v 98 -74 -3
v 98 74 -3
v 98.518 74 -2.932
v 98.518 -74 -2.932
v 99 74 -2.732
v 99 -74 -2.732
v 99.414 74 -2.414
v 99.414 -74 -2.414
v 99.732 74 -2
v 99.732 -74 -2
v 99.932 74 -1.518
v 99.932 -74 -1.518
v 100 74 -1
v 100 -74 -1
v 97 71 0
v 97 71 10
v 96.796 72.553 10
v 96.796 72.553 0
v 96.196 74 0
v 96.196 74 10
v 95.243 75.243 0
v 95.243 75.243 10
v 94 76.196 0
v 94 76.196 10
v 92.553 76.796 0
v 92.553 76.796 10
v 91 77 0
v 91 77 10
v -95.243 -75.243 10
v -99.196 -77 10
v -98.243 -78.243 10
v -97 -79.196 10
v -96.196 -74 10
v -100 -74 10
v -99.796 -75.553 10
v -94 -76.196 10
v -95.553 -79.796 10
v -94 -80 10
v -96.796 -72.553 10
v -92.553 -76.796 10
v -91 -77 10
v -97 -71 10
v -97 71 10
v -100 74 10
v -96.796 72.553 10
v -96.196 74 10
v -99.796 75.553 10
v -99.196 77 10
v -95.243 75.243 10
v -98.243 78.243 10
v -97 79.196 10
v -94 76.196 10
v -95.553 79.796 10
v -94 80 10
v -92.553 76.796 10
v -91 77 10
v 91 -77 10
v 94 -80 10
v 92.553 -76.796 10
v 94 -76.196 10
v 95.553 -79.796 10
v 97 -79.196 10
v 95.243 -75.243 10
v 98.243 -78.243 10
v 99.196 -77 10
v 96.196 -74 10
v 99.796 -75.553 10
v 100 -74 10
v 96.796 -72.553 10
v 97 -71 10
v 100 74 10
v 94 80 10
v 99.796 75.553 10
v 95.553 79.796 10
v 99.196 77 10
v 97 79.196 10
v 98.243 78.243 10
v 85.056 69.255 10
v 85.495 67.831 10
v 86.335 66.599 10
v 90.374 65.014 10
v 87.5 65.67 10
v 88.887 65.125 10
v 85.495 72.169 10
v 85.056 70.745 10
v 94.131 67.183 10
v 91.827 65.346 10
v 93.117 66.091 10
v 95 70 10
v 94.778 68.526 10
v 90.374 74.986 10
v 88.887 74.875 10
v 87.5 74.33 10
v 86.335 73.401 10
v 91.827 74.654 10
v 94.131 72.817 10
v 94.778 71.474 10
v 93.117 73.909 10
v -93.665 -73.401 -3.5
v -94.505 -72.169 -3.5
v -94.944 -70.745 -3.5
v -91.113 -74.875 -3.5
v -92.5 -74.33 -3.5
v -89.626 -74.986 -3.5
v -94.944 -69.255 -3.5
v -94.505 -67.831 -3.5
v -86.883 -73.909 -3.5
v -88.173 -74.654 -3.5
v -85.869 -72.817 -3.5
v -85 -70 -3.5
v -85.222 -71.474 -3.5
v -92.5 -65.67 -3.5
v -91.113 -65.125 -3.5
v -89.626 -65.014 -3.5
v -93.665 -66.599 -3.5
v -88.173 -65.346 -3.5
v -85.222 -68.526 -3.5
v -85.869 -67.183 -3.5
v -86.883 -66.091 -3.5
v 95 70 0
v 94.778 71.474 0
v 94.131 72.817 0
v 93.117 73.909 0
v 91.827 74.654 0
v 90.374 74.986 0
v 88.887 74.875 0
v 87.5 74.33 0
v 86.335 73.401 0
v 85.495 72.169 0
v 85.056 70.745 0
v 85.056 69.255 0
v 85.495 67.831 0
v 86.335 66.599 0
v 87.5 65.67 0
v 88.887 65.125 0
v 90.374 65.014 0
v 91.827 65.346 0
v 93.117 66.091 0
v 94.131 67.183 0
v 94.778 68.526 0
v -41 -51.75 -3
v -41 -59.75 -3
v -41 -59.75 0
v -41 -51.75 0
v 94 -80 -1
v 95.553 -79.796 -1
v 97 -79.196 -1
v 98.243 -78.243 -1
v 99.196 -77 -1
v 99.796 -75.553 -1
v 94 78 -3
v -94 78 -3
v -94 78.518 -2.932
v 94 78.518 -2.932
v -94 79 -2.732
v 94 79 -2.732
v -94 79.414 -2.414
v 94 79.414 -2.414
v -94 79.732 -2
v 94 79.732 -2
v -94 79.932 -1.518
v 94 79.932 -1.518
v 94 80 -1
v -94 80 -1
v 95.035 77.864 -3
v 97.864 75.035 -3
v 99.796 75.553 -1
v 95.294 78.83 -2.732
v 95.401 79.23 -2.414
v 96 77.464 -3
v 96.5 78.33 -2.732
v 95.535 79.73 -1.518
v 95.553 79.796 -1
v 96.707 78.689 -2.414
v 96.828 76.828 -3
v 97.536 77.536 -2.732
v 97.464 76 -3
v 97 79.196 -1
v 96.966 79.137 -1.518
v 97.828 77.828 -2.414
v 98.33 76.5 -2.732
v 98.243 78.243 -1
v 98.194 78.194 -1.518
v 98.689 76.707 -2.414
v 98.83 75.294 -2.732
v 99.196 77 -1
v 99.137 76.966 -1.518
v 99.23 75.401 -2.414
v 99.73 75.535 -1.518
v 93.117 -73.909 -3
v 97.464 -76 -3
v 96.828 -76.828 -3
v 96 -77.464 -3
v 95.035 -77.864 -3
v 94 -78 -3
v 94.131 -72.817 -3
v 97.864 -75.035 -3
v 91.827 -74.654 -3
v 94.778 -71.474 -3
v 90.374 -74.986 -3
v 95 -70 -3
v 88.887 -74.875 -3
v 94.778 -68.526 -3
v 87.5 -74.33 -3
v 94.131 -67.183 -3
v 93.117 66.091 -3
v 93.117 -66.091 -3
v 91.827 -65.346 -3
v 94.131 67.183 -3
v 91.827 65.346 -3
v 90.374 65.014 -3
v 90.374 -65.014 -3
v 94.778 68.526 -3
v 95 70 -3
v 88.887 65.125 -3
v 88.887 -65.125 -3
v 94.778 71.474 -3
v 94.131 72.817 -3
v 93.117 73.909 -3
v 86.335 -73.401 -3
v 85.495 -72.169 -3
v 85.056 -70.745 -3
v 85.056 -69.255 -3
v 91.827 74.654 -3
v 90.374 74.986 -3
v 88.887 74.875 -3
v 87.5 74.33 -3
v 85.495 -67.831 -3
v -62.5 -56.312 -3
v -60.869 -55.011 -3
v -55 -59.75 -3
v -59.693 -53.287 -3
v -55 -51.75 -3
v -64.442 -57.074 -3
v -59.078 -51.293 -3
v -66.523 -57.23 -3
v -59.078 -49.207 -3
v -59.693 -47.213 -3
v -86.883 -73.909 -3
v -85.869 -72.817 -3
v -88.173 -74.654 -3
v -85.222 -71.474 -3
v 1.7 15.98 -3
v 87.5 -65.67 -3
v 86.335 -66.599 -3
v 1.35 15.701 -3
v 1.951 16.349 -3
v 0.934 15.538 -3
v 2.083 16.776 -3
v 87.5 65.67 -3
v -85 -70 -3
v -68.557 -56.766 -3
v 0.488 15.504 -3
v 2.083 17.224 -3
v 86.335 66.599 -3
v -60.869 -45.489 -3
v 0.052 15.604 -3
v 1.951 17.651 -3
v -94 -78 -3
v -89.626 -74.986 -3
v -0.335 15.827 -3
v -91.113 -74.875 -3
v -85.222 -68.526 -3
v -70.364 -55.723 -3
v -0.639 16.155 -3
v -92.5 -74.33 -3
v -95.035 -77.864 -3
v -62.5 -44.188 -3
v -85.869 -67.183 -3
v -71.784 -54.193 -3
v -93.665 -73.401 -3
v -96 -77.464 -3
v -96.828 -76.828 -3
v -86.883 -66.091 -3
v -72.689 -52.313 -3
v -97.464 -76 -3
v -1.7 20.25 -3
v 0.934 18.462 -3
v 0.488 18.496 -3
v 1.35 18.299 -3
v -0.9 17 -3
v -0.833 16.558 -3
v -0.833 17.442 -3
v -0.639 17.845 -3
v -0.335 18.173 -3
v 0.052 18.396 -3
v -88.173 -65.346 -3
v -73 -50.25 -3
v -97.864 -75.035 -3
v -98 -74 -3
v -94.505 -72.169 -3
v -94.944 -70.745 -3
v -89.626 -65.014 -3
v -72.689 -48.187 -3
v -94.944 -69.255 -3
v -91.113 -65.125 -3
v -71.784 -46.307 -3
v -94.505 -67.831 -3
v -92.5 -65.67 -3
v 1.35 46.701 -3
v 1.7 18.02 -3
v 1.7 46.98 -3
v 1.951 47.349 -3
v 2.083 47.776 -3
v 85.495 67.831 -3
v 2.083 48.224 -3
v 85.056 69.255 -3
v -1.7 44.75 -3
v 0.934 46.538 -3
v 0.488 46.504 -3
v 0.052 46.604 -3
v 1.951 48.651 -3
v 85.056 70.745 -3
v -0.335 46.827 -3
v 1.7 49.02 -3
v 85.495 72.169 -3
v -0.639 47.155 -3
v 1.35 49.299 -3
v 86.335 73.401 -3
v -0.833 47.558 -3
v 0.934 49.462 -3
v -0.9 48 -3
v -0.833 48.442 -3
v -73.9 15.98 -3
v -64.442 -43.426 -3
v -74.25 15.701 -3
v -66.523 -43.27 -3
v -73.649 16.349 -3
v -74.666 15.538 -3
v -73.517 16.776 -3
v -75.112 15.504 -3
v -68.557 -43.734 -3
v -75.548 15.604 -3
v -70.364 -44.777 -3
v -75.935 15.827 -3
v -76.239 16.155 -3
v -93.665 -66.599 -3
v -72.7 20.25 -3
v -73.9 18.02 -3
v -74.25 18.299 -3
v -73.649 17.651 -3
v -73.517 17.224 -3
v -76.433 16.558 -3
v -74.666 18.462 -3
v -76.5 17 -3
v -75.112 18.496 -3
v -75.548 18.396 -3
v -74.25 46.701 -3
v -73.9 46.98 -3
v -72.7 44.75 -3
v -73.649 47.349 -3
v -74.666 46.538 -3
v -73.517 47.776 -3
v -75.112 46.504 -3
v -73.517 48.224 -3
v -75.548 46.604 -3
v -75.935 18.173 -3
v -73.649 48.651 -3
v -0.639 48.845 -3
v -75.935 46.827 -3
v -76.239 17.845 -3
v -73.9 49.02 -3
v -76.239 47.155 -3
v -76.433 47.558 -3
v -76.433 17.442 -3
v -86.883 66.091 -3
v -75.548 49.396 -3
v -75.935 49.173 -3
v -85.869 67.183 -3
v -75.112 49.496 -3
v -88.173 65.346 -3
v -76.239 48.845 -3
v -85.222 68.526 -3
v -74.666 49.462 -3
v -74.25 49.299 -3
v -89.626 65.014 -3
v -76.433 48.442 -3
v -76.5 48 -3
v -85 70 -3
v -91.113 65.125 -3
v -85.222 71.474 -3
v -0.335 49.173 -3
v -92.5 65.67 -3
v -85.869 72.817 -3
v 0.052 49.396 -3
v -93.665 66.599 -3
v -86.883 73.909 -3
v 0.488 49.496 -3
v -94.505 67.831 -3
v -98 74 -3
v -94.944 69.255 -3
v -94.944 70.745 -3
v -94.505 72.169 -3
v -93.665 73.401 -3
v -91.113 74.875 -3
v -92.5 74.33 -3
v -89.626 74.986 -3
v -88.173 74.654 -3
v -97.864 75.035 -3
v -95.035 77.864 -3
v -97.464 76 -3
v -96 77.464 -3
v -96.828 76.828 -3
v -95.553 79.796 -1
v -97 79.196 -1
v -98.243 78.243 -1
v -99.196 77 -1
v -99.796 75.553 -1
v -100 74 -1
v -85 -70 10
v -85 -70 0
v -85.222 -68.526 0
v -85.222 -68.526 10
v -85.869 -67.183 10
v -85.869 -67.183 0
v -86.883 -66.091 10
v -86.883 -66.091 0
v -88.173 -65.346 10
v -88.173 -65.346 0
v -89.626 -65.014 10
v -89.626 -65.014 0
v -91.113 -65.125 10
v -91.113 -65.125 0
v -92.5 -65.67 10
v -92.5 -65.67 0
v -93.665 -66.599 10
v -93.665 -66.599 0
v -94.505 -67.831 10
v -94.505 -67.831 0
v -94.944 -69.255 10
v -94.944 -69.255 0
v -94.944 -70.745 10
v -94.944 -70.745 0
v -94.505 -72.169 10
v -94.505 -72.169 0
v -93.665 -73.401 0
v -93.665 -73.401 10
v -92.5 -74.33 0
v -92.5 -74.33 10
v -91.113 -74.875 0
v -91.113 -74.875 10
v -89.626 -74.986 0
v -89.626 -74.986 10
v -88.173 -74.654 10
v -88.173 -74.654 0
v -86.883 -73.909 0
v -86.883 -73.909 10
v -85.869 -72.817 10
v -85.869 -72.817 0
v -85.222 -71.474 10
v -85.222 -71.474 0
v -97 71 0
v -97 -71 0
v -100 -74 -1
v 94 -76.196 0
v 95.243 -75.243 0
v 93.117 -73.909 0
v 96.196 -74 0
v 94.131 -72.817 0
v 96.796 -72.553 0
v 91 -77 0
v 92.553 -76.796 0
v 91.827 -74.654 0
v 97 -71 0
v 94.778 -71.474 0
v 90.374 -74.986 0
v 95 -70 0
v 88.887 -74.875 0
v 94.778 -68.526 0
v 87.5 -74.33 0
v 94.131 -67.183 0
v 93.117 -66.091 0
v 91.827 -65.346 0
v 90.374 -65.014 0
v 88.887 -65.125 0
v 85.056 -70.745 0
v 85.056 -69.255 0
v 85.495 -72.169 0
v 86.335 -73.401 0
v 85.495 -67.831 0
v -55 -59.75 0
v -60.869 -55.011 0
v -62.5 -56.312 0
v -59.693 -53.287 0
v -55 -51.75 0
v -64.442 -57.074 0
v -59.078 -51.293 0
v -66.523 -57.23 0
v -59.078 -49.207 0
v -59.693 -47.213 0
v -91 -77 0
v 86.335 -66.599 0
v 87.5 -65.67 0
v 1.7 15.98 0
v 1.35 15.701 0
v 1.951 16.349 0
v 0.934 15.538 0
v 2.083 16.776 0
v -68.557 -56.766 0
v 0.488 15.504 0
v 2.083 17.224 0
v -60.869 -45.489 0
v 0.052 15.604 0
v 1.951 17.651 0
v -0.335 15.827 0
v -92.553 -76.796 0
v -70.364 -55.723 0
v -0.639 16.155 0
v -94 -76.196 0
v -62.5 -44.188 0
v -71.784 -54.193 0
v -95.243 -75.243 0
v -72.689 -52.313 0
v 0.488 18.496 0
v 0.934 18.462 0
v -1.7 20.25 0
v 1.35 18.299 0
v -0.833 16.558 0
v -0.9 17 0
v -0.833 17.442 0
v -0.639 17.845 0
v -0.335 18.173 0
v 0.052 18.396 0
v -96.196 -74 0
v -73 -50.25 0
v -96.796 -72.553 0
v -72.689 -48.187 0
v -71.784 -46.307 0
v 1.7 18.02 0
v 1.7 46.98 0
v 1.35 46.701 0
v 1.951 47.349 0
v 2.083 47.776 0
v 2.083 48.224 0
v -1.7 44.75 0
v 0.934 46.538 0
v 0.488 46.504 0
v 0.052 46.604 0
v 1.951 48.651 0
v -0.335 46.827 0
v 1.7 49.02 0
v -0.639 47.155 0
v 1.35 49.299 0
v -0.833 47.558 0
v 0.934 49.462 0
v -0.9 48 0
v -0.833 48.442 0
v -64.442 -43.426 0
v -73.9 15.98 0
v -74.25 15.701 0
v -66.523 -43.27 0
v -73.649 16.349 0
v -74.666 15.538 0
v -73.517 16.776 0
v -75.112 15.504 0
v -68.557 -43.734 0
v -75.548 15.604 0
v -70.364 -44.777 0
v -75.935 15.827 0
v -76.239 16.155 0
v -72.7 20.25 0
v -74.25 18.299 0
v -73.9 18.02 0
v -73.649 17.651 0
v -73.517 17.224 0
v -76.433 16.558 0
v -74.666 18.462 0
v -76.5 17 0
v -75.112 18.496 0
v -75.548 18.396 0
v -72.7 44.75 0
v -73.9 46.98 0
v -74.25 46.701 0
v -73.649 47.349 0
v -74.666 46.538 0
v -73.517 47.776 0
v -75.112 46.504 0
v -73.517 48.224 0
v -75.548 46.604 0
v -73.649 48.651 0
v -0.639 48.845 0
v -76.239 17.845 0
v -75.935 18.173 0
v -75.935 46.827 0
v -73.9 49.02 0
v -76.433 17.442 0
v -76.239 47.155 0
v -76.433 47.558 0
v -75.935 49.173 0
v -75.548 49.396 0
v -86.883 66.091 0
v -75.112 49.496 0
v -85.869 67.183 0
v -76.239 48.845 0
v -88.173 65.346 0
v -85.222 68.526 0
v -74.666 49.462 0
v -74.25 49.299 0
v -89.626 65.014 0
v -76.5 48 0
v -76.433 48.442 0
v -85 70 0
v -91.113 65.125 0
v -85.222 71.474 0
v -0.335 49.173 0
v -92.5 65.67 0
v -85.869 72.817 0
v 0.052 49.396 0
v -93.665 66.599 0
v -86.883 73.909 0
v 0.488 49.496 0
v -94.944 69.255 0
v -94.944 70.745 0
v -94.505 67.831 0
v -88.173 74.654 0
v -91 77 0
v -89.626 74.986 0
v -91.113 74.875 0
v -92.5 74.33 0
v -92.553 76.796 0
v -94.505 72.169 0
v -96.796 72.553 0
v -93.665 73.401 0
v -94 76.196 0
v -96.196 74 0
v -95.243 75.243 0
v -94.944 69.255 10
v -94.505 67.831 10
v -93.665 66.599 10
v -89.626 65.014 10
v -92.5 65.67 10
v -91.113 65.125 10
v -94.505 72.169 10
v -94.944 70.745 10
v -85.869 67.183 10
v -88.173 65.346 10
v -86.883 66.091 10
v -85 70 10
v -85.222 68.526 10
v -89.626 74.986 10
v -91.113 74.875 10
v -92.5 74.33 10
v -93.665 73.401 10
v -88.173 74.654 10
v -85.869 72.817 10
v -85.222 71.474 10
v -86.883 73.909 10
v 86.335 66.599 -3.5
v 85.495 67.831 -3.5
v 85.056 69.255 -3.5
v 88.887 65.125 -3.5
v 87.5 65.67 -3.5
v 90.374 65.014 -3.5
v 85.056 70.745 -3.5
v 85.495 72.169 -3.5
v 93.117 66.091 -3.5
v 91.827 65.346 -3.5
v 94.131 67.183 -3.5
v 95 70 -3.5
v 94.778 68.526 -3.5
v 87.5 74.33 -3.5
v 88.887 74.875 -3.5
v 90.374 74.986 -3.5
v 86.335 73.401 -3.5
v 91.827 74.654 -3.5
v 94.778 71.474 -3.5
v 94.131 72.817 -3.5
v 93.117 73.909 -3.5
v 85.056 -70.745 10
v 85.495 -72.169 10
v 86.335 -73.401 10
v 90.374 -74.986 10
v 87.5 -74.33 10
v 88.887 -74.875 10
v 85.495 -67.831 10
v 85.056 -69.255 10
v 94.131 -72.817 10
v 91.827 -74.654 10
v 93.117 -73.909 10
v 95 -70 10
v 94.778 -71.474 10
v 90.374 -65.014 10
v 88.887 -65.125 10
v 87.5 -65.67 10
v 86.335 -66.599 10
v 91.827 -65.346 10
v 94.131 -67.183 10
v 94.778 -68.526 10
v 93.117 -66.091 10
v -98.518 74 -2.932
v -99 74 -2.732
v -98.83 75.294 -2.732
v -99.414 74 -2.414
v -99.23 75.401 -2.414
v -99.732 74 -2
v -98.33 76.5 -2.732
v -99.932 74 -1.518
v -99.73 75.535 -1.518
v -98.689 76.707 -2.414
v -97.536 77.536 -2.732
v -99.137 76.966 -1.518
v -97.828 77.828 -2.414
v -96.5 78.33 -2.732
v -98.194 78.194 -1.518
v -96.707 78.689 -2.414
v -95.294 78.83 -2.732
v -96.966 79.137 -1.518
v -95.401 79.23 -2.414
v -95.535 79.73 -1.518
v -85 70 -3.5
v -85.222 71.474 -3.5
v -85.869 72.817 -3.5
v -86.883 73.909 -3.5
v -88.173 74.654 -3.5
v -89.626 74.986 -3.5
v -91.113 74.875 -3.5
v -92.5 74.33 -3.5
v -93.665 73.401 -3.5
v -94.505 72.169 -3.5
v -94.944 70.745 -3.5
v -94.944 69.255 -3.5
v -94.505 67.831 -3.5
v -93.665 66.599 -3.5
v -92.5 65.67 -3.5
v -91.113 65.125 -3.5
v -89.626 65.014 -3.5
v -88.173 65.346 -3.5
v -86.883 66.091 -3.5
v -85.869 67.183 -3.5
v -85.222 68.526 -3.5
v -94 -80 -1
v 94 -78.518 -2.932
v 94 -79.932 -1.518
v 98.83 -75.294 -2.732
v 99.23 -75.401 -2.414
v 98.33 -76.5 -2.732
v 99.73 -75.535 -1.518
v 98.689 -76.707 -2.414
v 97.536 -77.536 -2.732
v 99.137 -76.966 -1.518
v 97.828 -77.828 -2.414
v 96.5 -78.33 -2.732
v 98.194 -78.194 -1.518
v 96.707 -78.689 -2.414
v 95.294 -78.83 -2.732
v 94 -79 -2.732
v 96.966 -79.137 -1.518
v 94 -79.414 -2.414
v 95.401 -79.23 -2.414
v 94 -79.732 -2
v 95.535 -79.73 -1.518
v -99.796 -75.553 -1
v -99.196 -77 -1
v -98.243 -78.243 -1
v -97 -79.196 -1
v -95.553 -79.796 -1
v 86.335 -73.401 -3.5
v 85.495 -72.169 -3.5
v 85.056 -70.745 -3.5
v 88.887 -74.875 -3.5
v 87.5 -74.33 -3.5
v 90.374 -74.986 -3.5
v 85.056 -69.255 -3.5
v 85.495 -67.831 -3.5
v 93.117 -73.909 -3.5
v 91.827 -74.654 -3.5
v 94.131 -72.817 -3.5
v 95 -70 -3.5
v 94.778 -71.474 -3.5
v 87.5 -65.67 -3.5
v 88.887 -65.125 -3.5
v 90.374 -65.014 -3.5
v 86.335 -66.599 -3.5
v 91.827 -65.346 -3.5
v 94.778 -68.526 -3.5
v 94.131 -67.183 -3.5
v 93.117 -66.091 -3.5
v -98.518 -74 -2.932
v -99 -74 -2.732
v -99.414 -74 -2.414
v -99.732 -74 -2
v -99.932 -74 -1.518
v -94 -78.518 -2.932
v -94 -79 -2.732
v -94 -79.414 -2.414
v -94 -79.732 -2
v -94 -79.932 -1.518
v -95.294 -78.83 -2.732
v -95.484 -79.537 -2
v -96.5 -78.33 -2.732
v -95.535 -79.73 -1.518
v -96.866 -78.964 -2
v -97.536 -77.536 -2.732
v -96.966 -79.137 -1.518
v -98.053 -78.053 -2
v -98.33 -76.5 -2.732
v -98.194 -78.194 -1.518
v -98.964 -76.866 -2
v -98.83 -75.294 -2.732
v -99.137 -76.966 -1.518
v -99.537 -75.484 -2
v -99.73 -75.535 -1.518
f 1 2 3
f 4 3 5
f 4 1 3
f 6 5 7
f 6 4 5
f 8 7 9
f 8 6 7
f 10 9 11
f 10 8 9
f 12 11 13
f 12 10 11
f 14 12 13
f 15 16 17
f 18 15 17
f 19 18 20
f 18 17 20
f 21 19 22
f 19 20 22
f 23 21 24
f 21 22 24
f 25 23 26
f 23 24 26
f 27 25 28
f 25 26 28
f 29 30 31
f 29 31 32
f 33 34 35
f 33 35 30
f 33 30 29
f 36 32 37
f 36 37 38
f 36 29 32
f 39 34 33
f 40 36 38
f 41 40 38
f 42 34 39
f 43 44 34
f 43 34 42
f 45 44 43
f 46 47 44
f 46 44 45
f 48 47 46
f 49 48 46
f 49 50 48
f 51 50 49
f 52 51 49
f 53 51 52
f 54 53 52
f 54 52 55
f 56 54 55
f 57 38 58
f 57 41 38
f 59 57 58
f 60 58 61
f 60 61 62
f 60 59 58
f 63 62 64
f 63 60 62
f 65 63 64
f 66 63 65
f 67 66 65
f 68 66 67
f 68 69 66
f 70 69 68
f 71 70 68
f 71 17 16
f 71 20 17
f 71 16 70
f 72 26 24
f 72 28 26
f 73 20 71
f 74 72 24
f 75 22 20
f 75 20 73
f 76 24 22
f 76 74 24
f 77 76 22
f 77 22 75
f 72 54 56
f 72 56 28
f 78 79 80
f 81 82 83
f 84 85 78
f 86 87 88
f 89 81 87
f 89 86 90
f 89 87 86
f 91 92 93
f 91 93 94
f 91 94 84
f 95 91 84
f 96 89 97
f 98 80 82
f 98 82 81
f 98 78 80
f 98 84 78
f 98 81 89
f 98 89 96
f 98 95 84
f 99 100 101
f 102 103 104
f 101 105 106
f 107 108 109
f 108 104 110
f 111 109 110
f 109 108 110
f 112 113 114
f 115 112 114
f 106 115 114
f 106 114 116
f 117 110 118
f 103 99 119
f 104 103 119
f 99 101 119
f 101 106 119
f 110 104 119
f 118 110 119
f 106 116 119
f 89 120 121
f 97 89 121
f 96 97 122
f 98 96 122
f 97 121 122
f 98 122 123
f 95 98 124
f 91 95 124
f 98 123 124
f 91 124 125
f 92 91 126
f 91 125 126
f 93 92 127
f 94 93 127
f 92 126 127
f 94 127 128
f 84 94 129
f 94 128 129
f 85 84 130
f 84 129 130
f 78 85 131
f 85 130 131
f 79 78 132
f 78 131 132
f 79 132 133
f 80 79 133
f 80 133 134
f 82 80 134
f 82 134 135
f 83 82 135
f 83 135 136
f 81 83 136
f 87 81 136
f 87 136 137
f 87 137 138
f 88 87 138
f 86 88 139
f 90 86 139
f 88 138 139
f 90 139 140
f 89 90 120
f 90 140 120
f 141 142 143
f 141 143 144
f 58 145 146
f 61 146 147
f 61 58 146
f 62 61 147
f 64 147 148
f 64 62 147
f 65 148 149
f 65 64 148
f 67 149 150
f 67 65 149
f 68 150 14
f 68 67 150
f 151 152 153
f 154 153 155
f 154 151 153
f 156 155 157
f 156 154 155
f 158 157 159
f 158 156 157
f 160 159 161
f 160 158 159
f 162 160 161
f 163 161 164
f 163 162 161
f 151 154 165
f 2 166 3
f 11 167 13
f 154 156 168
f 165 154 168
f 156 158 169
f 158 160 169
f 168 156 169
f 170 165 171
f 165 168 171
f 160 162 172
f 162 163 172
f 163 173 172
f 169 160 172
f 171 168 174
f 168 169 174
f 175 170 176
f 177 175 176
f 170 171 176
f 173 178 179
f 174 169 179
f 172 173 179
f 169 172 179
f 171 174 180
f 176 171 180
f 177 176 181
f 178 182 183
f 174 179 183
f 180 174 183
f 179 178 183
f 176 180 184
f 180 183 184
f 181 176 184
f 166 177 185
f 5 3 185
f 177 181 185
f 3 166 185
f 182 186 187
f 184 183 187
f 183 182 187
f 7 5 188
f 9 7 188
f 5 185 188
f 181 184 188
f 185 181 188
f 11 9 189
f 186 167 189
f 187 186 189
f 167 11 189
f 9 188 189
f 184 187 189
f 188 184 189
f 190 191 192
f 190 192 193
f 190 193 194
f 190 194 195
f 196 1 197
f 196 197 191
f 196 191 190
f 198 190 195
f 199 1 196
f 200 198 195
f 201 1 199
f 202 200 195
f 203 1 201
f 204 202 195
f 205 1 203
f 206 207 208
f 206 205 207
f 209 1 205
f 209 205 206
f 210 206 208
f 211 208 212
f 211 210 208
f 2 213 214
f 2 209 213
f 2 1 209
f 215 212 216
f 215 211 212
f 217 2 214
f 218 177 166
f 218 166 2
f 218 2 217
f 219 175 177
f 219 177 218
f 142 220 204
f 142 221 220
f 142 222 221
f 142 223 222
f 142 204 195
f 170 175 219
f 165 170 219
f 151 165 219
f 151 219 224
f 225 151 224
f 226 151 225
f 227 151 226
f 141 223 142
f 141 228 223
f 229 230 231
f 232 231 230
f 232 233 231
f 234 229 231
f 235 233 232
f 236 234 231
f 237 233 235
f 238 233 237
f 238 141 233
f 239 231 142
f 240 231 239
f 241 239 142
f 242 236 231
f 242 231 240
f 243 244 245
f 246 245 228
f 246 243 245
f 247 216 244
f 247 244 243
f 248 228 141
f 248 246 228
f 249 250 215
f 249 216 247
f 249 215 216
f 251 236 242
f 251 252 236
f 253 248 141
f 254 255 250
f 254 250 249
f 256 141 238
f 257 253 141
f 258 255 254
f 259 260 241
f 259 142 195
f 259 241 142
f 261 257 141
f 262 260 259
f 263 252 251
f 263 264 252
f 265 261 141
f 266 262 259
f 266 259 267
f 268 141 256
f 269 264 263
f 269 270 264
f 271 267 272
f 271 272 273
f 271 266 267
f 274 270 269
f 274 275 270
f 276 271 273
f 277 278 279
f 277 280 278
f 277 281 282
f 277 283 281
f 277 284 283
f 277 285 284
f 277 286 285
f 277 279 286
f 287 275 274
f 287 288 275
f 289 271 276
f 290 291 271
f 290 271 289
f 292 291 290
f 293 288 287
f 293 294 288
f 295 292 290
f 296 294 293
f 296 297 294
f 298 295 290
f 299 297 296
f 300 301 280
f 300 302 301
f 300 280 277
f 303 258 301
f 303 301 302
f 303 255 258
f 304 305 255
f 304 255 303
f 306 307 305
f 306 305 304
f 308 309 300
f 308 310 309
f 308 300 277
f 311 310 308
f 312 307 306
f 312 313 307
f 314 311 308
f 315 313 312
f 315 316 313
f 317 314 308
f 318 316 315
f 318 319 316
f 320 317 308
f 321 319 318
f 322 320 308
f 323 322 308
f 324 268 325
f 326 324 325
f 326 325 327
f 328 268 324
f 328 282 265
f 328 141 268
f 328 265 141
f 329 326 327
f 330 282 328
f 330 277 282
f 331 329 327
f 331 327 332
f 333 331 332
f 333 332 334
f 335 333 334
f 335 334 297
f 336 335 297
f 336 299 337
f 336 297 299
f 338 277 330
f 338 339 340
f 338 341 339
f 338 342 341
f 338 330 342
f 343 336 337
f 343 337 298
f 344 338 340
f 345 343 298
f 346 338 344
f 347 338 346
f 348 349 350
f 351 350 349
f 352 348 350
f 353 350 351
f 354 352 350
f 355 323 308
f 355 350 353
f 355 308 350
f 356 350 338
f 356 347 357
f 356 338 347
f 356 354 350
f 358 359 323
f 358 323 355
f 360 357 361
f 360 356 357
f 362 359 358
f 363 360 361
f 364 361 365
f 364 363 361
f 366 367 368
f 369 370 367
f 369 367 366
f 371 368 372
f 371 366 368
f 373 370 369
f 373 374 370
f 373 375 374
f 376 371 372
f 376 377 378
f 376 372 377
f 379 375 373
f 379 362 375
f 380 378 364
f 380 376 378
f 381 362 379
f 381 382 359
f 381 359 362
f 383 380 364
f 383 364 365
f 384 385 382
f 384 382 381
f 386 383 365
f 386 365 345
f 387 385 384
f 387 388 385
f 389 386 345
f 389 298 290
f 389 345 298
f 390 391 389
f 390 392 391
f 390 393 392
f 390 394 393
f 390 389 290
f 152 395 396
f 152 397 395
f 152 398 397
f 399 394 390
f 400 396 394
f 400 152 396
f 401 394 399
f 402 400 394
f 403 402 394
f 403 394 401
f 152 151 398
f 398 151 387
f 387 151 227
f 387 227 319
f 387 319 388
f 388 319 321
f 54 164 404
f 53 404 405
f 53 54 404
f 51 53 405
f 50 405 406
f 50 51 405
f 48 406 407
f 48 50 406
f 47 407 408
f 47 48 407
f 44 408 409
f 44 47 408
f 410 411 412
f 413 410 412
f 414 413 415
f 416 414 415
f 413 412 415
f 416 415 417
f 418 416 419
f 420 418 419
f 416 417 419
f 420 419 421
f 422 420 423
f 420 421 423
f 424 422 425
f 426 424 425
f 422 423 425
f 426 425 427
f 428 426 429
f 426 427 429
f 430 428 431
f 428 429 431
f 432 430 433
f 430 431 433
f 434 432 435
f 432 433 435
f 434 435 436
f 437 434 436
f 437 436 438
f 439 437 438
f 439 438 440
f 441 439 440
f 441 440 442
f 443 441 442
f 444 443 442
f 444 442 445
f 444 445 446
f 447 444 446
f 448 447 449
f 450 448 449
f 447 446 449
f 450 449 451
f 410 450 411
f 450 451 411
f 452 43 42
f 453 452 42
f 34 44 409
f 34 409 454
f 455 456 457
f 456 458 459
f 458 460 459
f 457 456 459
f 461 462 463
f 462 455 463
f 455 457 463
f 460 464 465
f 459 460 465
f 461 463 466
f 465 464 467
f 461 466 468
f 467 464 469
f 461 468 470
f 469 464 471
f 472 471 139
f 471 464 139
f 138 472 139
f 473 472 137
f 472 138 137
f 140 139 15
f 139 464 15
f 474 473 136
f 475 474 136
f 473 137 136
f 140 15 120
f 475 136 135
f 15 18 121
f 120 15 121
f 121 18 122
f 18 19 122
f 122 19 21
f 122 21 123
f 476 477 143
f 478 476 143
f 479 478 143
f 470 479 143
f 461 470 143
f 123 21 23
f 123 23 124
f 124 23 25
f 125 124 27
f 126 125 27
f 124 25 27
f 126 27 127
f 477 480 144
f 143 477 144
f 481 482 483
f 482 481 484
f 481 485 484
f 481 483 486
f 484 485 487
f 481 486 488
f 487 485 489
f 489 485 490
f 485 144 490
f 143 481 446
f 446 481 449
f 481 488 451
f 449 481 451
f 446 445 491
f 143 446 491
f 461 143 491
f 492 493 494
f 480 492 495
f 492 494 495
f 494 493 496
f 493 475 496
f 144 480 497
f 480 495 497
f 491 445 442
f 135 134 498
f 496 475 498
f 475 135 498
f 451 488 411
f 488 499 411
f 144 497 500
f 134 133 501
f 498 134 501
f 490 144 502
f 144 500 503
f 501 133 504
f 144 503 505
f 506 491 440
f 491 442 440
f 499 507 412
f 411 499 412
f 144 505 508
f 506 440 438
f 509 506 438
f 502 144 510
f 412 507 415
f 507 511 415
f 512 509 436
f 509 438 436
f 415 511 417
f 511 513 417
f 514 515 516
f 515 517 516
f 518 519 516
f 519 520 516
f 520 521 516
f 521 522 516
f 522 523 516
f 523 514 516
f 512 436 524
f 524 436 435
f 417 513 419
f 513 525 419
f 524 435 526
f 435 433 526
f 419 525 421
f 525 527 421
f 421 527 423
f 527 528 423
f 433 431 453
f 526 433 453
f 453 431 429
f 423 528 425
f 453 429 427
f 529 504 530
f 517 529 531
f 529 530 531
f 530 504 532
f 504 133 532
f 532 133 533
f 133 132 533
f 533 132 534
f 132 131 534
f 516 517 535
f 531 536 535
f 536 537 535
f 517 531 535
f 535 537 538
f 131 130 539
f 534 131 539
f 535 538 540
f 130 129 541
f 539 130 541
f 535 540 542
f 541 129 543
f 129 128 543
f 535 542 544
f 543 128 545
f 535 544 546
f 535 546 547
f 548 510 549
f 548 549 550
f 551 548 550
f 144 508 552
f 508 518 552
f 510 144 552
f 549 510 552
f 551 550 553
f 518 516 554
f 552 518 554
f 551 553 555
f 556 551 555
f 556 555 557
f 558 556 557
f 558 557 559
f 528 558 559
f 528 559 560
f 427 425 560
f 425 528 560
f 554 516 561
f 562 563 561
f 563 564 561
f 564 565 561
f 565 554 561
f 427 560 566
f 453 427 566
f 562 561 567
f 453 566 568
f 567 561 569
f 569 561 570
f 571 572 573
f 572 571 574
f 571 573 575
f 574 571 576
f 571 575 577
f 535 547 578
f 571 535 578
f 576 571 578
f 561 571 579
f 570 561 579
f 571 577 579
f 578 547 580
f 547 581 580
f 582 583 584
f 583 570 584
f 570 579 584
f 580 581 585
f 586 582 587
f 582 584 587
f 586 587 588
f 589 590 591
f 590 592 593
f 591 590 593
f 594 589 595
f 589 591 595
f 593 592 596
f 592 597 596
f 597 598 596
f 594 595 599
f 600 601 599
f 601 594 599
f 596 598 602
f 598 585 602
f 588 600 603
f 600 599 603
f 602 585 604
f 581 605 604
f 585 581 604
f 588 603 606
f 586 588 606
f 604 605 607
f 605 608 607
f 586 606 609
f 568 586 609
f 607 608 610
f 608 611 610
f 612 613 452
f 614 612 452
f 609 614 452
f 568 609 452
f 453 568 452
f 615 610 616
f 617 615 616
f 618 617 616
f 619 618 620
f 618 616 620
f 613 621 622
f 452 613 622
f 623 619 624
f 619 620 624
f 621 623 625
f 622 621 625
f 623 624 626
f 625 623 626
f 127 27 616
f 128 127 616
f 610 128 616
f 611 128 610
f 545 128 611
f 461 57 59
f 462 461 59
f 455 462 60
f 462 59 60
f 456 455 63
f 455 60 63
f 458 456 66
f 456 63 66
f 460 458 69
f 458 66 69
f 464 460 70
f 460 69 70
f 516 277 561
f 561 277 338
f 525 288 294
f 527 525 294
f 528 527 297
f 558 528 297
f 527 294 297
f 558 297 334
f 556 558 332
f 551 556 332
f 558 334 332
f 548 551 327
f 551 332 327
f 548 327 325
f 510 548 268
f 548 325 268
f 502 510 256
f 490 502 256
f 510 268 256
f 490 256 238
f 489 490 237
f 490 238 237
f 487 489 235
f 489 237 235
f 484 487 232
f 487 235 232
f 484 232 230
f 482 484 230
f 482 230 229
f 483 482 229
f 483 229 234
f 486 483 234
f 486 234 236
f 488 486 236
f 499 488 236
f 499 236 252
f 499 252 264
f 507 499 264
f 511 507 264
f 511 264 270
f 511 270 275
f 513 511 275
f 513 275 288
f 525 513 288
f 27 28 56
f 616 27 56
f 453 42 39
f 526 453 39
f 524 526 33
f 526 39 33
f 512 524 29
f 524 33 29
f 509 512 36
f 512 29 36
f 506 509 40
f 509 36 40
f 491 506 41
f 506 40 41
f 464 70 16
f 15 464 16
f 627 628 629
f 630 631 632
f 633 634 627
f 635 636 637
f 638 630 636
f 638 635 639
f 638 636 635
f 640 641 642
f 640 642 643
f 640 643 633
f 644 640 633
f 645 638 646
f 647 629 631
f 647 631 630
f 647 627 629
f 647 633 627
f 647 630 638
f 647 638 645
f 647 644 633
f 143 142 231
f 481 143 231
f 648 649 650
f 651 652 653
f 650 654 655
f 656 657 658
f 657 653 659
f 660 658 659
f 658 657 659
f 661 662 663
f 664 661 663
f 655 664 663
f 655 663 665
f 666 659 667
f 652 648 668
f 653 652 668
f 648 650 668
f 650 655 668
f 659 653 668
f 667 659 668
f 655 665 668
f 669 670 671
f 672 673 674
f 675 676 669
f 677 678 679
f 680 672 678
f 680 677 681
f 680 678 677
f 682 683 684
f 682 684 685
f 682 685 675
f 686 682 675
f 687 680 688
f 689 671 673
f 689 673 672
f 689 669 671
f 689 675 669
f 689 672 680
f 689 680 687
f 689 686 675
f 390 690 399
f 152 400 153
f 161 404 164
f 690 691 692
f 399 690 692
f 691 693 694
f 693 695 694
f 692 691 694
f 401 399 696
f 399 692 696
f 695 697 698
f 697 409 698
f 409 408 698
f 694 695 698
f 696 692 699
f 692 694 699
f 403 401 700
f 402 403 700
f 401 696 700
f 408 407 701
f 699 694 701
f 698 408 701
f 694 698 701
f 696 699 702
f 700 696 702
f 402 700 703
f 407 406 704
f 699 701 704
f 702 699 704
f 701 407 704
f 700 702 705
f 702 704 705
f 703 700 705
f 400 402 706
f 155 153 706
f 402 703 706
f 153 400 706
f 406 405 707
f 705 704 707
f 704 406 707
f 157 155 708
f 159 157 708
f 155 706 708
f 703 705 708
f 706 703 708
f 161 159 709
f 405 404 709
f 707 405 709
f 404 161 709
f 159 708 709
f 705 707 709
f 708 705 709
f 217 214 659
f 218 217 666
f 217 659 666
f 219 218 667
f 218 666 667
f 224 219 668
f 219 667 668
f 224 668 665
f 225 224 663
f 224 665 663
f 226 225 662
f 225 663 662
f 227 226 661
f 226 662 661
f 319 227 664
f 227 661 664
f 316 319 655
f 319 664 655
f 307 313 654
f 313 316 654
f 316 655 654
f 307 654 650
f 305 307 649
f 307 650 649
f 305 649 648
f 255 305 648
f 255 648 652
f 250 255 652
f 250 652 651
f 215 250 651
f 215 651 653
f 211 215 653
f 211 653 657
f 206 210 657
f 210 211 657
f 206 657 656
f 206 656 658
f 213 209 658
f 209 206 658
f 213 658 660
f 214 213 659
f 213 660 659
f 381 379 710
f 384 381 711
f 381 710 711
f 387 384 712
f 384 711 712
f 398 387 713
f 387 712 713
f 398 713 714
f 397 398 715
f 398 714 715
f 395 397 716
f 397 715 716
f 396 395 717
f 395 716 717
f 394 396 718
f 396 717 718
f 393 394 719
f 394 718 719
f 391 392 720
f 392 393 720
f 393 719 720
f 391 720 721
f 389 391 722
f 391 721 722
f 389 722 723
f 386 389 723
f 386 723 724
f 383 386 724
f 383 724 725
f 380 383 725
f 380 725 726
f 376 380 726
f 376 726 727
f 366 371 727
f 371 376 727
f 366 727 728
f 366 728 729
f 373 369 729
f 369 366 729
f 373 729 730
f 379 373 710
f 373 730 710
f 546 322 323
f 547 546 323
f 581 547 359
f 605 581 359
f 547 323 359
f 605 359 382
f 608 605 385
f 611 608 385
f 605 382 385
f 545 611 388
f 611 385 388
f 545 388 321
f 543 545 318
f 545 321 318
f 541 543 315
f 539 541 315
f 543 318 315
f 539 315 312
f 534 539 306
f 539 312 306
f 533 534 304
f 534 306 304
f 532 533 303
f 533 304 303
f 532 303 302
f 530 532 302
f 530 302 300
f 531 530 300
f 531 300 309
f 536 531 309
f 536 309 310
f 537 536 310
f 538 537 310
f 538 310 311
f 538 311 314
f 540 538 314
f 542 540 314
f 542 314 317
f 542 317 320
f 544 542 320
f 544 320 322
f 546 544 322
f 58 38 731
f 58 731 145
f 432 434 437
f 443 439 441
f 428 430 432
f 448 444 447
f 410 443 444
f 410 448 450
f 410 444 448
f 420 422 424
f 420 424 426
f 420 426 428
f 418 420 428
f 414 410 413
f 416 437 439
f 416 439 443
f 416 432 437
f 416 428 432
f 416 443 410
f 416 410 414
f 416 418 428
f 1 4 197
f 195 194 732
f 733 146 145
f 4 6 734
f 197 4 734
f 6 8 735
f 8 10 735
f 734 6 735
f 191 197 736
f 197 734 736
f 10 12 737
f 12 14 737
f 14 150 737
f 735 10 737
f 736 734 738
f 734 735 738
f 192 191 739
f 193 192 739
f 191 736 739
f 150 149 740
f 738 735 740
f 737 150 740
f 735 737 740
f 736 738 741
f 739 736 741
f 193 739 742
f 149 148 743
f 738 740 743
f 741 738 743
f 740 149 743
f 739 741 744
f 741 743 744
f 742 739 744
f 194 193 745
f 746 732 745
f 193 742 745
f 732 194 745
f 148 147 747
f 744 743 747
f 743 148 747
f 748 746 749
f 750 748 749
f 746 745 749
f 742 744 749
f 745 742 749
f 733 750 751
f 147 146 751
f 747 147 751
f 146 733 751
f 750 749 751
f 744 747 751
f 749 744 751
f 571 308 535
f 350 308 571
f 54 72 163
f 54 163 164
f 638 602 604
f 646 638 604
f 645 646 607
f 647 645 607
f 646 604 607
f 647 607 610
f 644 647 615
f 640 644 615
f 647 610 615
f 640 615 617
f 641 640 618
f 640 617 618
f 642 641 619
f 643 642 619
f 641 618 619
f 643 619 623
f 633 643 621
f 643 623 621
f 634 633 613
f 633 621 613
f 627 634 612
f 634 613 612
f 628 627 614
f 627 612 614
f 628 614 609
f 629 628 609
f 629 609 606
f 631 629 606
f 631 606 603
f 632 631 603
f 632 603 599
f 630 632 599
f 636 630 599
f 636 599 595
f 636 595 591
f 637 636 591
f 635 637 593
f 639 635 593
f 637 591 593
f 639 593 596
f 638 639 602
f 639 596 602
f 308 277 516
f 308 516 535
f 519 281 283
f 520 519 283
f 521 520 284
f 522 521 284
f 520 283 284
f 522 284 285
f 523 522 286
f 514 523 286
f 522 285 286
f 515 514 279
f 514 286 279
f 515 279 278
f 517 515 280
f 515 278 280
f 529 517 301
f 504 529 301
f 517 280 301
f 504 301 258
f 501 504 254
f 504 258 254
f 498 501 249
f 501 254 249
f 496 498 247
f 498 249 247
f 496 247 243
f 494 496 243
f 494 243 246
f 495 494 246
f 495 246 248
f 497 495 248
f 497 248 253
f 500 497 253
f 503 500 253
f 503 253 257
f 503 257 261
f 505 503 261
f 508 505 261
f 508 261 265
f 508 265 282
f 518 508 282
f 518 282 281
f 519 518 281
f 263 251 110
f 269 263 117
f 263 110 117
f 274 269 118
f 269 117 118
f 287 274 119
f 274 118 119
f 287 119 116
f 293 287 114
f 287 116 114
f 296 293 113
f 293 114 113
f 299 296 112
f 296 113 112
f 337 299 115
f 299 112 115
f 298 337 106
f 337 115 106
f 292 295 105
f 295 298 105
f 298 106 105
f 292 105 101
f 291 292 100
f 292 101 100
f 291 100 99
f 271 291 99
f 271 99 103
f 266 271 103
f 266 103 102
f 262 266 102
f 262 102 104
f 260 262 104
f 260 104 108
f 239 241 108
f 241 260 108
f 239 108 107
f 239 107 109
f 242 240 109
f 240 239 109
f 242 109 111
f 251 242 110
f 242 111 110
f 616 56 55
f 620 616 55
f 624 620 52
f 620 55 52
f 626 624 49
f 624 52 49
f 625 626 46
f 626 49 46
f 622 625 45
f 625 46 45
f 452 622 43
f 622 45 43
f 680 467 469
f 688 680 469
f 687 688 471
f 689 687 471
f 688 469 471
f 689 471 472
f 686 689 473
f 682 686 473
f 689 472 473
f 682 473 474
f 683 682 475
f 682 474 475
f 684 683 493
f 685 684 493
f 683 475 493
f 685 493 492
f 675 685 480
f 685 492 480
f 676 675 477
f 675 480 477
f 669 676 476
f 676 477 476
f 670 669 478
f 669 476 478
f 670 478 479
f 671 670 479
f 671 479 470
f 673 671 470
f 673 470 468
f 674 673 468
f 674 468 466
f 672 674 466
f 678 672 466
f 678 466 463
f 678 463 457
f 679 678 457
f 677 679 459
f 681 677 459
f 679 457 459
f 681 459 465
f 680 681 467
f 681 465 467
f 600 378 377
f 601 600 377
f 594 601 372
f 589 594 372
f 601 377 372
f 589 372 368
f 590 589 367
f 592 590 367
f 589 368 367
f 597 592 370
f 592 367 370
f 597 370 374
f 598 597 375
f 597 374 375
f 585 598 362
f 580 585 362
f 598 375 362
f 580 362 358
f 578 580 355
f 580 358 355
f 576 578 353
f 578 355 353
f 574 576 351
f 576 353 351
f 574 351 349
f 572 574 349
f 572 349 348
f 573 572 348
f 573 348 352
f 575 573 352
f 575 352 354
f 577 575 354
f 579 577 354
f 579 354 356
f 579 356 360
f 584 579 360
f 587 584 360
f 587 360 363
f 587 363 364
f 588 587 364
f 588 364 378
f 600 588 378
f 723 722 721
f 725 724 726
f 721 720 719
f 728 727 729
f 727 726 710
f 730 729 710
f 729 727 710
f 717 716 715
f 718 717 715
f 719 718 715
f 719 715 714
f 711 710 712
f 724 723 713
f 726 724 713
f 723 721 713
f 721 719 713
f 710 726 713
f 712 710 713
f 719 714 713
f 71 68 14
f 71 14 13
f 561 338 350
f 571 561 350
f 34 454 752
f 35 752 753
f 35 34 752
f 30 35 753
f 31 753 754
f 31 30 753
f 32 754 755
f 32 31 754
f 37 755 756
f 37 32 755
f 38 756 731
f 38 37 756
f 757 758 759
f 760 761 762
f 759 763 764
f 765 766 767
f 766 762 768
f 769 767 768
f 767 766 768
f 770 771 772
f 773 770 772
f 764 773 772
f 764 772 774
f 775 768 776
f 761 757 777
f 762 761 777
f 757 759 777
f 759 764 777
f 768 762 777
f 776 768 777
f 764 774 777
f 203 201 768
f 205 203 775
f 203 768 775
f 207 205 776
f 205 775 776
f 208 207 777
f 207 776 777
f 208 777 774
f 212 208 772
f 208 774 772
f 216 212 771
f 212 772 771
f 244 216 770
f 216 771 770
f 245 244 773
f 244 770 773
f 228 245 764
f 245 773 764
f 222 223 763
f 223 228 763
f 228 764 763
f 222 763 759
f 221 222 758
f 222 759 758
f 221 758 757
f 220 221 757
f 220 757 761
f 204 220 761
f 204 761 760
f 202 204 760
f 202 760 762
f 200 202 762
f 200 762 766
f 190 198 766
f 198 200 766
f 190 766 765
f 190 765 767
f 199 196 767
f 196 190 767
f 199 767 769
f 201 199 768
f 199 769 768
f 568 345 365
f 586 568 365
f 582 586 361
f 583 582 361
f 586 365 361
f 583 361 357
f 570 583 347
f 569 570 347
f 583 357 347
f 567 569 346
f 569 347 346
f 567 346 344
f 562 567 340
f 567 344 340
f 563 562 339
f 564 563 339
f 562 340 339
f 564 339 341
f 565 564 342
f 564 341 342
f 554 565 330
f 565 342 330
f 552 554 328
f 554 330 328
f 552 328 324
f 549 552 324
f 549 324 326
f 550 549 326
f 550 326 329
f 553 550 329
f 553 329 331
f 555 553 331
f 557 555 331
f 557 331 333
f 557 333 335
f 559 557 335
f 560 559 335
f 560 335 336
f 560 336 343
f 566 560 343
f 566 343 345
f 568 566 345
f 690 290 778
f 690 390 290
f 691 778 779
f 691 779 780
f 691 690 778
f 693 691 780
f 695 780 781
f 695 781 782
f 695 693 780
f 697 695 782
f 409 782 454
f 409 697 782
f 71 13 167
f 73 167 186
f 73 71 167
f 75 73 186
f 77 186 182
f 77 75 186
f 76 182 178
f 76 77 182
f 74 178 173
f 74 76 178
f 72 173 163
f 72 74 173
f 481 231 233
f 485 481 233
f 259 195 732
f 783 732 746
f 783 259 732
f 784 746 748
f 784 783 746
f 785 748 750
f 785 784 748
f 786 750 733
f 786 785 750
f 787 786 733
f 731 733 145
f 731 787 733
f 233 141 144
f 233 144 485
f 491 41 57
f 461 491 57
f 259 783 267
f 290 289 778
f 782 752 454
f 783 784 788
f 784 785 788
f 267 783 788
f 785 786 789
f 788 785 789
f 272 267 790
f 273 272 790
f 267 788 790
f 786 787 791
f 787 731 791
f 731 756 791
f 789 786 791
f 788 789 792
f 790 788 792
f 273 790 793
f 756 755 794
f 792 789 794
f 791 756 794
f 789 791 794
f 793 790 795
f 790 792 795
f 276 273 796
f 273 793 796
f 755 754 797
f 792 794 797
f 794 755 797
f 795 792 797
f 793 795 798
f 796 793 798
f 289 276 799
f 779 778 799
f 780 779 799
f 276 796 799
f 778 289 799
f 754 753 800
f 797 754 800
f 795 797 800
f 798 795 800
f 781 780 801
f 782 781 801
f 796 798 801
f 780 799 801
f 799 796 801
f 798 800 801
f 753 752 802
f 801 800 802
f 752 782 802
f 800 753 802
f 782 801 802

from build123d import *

# Parameters (mm, degrees)
BOSS_EXTRU_1_DEPTH      = 3
BOSS_EXTRU_2_START      = 10
BOSS_EXTRU_2_DEPTH      = 10
ESQUISSE2_R             = 5
BOSS_EXTRU_3_DEPTH      = 10
CONG_1_R                = 2
BOSS_EXTRU_4_START      = -3.5
ESQUISSE2_2_R           = 5
BOSS_EXTRU_4_DEPTH      = 3.5
ESQUISSE3_R             = 1.5
ESQUISSE3_W             = 71
ESQUISSE3_H             = 24.5
ENL_V_MAT_EXTRU_1_DEPTH = 3.5
ESQUISSE4_R             = 7
ESQUISSE4_W             = 14
ESQUISSE4_H             = 8
ENL_V_MAT_EXTRU_2_DEPTH = 10


with BuildPart() as part:
    # Esquisse1 → Boss.-Extru.1 (new body)
    with BuildSketch(Plane.XY):
        with BuildLine():
            ThreePointArc((-100, -74), (-98.242640687, -78.242640687), (-94, -80))
            Line((-94, -80), (94, -80))
            ThreePointArc((94, -80), (98.242640687, -78.242640687), (100, -74))
            Line((100, -74), (100, 74))
            ThreePointArc((100, 74), (98.242640687, 78.242640687), (94, 80))
            Line((94, 80), (-94, 80))
            ThreePointArc((-94, 80), (-98.242640687, 78.242640687), (-100, 74))
            Line((-100, 74), (-100, -74))
        make_face()
    extrude(amount=-BOSS_EXTRU_1_DEPTH)

    # Esquisse1<3> → Boss.-Extru.2 (add)
    with BuildSketch(Plane.XY.offset(BOSS_EXTRU_2_START)):
        with BuildLine():
            Line((-94, -80), (94, -80))
            ThreePointArc((94, -80), (98.242640687, -78.242640687), (100, -74))
            Line((100, -74), (100, 74))
            ThreePointArc((100, 74), (98.242640687, 78.242640687), (94, 80))
            Line((94, 80), (-94, 80))
            ThreePointArc((-94, 80), (-98.242640687, 78.242640687), (-100, 74))
            Line((-100, 74), (-100, -74))
            ThreePointArc((-100, -74), (-98.242640687, -78.242640687), (-94, -80))
        make_face()
        with BuildLine():
            Line((-91, -77), (91, -77))
            ThreePointArc((91, -77), (95.242640687, -75.242640687), (97, -71))
            Line((97, -71), (97, 71))
            ThreePointArc((97, 71), (95.242640687, 75.242640687), (91, 77))
            Line((91, 77), (-91, 77))
            ThreePointArc((-91, 77), (-95.242640687, 75.242640687), (-97, 71))
            Line((-97, 71), (-97, -71))
            ThreePointArc((-97, -71), (-95.242640687, -75.242640687), (-91, -77))
        make_face(mode=Mode.SUBTRACT)
    extrude(amount=-BOSS_EXTRU_2_DEPTH)

    # Esquisse2 → Boss.-Extru.3 (add)
    with BuildSketch(Plane.XY):
        with Locations((-90, 70)):
            Circle(ESQUISSE2_R)
        with Locations((90, 70)):
            Circle(ESQUISSE2_R)
        with Locations((90, -70)):
            Circle(ESQUISSE2_R)
        with Locations((-90, -70)):
            Circle(ESQUISSE2_R)
    extrude(amount=BOSS_EXTRU_3_DEPTH)

    # Congé1
    cong_1_edges = [part.edges().sort_by_distance(p)[0] for p in [
        (-100, 0, -3),
        (-98.242640687, -78.242640687, -3),
        (0, -80, -3),
        (98.242640687, -78.242640687, -3),
        (100, 0, -3),
        (98.242640687, 78.242640687, -3),
        (0, 80, -3),
        (-98.242640687, 78.242640687, -3),
    ]]
    fillet(cong_1_edges, radius=CONG_1_R)

    # Esquisse2<2> → Boss.-Extru.4 (add)
    with BuildSketch(Plane.XY.offset(BOSS_EXTRU_4_START)):
        with Locations((-90, 70)):
            Circle(ESQUISSE2_2_R)
        with Locations((90, 70)):
            Circle(ESQUISSE2_2_R)
        with Locations((90, -70)):
            Circle(ESQUISSE2_2_R)
        with Locations((-90, -70)):
            Circle(ESQUISSE2_2_R)
    extrude(amount=BOSS_EXTRU_4_DEPTH)

    # Esquisse3 → Enlèv. mat.-Extru.1 (cut)
    with BuildSketch(Plane(origin=(0, 0, -3), x_dir=(-1, 0, 0), z_dir=(0, 0, -1))):
        with Locations((-0.6, 48)):
            Circle(ESQUISSE3_R)
        with Locations((-0.6, 17)):
            Circle(ESQUISSE3_R)
        with Locations((75, 17)):
            Circle(ESQUISSE3_R)
        with Locations((75, 48)):
            Circle(ESQUISSE3_R)
        with Locations((37.2, 32.5)):
            Rectangle(ESQUISSE3_W, ESQUISSE3_H)
    extrude(amount=-ENL_V_MAT_EXTRU_1_DEPTH, mode=Mode.SUBTRACT)

    # Esquisse4 → Enlèv. mat.-Extru.2 (cut)
    with BuildSketch(Plane(origin=(0, 0, -3), x_dir=(-1, 0, 0), z_dir=(0, 0, -1))):
        with Locations((66, -50.25)):
            Circle(ESQUISSE4_R)
        with Locations((48, -55.75)):
            Rectangle(ESQUISSE4_W, ESQUISSE4_H)
    extrude(amount=-ENL_V_MAT_EXTRU_2_DEPTH, mode=Mode.SUBTRACT)


solid = part.part
